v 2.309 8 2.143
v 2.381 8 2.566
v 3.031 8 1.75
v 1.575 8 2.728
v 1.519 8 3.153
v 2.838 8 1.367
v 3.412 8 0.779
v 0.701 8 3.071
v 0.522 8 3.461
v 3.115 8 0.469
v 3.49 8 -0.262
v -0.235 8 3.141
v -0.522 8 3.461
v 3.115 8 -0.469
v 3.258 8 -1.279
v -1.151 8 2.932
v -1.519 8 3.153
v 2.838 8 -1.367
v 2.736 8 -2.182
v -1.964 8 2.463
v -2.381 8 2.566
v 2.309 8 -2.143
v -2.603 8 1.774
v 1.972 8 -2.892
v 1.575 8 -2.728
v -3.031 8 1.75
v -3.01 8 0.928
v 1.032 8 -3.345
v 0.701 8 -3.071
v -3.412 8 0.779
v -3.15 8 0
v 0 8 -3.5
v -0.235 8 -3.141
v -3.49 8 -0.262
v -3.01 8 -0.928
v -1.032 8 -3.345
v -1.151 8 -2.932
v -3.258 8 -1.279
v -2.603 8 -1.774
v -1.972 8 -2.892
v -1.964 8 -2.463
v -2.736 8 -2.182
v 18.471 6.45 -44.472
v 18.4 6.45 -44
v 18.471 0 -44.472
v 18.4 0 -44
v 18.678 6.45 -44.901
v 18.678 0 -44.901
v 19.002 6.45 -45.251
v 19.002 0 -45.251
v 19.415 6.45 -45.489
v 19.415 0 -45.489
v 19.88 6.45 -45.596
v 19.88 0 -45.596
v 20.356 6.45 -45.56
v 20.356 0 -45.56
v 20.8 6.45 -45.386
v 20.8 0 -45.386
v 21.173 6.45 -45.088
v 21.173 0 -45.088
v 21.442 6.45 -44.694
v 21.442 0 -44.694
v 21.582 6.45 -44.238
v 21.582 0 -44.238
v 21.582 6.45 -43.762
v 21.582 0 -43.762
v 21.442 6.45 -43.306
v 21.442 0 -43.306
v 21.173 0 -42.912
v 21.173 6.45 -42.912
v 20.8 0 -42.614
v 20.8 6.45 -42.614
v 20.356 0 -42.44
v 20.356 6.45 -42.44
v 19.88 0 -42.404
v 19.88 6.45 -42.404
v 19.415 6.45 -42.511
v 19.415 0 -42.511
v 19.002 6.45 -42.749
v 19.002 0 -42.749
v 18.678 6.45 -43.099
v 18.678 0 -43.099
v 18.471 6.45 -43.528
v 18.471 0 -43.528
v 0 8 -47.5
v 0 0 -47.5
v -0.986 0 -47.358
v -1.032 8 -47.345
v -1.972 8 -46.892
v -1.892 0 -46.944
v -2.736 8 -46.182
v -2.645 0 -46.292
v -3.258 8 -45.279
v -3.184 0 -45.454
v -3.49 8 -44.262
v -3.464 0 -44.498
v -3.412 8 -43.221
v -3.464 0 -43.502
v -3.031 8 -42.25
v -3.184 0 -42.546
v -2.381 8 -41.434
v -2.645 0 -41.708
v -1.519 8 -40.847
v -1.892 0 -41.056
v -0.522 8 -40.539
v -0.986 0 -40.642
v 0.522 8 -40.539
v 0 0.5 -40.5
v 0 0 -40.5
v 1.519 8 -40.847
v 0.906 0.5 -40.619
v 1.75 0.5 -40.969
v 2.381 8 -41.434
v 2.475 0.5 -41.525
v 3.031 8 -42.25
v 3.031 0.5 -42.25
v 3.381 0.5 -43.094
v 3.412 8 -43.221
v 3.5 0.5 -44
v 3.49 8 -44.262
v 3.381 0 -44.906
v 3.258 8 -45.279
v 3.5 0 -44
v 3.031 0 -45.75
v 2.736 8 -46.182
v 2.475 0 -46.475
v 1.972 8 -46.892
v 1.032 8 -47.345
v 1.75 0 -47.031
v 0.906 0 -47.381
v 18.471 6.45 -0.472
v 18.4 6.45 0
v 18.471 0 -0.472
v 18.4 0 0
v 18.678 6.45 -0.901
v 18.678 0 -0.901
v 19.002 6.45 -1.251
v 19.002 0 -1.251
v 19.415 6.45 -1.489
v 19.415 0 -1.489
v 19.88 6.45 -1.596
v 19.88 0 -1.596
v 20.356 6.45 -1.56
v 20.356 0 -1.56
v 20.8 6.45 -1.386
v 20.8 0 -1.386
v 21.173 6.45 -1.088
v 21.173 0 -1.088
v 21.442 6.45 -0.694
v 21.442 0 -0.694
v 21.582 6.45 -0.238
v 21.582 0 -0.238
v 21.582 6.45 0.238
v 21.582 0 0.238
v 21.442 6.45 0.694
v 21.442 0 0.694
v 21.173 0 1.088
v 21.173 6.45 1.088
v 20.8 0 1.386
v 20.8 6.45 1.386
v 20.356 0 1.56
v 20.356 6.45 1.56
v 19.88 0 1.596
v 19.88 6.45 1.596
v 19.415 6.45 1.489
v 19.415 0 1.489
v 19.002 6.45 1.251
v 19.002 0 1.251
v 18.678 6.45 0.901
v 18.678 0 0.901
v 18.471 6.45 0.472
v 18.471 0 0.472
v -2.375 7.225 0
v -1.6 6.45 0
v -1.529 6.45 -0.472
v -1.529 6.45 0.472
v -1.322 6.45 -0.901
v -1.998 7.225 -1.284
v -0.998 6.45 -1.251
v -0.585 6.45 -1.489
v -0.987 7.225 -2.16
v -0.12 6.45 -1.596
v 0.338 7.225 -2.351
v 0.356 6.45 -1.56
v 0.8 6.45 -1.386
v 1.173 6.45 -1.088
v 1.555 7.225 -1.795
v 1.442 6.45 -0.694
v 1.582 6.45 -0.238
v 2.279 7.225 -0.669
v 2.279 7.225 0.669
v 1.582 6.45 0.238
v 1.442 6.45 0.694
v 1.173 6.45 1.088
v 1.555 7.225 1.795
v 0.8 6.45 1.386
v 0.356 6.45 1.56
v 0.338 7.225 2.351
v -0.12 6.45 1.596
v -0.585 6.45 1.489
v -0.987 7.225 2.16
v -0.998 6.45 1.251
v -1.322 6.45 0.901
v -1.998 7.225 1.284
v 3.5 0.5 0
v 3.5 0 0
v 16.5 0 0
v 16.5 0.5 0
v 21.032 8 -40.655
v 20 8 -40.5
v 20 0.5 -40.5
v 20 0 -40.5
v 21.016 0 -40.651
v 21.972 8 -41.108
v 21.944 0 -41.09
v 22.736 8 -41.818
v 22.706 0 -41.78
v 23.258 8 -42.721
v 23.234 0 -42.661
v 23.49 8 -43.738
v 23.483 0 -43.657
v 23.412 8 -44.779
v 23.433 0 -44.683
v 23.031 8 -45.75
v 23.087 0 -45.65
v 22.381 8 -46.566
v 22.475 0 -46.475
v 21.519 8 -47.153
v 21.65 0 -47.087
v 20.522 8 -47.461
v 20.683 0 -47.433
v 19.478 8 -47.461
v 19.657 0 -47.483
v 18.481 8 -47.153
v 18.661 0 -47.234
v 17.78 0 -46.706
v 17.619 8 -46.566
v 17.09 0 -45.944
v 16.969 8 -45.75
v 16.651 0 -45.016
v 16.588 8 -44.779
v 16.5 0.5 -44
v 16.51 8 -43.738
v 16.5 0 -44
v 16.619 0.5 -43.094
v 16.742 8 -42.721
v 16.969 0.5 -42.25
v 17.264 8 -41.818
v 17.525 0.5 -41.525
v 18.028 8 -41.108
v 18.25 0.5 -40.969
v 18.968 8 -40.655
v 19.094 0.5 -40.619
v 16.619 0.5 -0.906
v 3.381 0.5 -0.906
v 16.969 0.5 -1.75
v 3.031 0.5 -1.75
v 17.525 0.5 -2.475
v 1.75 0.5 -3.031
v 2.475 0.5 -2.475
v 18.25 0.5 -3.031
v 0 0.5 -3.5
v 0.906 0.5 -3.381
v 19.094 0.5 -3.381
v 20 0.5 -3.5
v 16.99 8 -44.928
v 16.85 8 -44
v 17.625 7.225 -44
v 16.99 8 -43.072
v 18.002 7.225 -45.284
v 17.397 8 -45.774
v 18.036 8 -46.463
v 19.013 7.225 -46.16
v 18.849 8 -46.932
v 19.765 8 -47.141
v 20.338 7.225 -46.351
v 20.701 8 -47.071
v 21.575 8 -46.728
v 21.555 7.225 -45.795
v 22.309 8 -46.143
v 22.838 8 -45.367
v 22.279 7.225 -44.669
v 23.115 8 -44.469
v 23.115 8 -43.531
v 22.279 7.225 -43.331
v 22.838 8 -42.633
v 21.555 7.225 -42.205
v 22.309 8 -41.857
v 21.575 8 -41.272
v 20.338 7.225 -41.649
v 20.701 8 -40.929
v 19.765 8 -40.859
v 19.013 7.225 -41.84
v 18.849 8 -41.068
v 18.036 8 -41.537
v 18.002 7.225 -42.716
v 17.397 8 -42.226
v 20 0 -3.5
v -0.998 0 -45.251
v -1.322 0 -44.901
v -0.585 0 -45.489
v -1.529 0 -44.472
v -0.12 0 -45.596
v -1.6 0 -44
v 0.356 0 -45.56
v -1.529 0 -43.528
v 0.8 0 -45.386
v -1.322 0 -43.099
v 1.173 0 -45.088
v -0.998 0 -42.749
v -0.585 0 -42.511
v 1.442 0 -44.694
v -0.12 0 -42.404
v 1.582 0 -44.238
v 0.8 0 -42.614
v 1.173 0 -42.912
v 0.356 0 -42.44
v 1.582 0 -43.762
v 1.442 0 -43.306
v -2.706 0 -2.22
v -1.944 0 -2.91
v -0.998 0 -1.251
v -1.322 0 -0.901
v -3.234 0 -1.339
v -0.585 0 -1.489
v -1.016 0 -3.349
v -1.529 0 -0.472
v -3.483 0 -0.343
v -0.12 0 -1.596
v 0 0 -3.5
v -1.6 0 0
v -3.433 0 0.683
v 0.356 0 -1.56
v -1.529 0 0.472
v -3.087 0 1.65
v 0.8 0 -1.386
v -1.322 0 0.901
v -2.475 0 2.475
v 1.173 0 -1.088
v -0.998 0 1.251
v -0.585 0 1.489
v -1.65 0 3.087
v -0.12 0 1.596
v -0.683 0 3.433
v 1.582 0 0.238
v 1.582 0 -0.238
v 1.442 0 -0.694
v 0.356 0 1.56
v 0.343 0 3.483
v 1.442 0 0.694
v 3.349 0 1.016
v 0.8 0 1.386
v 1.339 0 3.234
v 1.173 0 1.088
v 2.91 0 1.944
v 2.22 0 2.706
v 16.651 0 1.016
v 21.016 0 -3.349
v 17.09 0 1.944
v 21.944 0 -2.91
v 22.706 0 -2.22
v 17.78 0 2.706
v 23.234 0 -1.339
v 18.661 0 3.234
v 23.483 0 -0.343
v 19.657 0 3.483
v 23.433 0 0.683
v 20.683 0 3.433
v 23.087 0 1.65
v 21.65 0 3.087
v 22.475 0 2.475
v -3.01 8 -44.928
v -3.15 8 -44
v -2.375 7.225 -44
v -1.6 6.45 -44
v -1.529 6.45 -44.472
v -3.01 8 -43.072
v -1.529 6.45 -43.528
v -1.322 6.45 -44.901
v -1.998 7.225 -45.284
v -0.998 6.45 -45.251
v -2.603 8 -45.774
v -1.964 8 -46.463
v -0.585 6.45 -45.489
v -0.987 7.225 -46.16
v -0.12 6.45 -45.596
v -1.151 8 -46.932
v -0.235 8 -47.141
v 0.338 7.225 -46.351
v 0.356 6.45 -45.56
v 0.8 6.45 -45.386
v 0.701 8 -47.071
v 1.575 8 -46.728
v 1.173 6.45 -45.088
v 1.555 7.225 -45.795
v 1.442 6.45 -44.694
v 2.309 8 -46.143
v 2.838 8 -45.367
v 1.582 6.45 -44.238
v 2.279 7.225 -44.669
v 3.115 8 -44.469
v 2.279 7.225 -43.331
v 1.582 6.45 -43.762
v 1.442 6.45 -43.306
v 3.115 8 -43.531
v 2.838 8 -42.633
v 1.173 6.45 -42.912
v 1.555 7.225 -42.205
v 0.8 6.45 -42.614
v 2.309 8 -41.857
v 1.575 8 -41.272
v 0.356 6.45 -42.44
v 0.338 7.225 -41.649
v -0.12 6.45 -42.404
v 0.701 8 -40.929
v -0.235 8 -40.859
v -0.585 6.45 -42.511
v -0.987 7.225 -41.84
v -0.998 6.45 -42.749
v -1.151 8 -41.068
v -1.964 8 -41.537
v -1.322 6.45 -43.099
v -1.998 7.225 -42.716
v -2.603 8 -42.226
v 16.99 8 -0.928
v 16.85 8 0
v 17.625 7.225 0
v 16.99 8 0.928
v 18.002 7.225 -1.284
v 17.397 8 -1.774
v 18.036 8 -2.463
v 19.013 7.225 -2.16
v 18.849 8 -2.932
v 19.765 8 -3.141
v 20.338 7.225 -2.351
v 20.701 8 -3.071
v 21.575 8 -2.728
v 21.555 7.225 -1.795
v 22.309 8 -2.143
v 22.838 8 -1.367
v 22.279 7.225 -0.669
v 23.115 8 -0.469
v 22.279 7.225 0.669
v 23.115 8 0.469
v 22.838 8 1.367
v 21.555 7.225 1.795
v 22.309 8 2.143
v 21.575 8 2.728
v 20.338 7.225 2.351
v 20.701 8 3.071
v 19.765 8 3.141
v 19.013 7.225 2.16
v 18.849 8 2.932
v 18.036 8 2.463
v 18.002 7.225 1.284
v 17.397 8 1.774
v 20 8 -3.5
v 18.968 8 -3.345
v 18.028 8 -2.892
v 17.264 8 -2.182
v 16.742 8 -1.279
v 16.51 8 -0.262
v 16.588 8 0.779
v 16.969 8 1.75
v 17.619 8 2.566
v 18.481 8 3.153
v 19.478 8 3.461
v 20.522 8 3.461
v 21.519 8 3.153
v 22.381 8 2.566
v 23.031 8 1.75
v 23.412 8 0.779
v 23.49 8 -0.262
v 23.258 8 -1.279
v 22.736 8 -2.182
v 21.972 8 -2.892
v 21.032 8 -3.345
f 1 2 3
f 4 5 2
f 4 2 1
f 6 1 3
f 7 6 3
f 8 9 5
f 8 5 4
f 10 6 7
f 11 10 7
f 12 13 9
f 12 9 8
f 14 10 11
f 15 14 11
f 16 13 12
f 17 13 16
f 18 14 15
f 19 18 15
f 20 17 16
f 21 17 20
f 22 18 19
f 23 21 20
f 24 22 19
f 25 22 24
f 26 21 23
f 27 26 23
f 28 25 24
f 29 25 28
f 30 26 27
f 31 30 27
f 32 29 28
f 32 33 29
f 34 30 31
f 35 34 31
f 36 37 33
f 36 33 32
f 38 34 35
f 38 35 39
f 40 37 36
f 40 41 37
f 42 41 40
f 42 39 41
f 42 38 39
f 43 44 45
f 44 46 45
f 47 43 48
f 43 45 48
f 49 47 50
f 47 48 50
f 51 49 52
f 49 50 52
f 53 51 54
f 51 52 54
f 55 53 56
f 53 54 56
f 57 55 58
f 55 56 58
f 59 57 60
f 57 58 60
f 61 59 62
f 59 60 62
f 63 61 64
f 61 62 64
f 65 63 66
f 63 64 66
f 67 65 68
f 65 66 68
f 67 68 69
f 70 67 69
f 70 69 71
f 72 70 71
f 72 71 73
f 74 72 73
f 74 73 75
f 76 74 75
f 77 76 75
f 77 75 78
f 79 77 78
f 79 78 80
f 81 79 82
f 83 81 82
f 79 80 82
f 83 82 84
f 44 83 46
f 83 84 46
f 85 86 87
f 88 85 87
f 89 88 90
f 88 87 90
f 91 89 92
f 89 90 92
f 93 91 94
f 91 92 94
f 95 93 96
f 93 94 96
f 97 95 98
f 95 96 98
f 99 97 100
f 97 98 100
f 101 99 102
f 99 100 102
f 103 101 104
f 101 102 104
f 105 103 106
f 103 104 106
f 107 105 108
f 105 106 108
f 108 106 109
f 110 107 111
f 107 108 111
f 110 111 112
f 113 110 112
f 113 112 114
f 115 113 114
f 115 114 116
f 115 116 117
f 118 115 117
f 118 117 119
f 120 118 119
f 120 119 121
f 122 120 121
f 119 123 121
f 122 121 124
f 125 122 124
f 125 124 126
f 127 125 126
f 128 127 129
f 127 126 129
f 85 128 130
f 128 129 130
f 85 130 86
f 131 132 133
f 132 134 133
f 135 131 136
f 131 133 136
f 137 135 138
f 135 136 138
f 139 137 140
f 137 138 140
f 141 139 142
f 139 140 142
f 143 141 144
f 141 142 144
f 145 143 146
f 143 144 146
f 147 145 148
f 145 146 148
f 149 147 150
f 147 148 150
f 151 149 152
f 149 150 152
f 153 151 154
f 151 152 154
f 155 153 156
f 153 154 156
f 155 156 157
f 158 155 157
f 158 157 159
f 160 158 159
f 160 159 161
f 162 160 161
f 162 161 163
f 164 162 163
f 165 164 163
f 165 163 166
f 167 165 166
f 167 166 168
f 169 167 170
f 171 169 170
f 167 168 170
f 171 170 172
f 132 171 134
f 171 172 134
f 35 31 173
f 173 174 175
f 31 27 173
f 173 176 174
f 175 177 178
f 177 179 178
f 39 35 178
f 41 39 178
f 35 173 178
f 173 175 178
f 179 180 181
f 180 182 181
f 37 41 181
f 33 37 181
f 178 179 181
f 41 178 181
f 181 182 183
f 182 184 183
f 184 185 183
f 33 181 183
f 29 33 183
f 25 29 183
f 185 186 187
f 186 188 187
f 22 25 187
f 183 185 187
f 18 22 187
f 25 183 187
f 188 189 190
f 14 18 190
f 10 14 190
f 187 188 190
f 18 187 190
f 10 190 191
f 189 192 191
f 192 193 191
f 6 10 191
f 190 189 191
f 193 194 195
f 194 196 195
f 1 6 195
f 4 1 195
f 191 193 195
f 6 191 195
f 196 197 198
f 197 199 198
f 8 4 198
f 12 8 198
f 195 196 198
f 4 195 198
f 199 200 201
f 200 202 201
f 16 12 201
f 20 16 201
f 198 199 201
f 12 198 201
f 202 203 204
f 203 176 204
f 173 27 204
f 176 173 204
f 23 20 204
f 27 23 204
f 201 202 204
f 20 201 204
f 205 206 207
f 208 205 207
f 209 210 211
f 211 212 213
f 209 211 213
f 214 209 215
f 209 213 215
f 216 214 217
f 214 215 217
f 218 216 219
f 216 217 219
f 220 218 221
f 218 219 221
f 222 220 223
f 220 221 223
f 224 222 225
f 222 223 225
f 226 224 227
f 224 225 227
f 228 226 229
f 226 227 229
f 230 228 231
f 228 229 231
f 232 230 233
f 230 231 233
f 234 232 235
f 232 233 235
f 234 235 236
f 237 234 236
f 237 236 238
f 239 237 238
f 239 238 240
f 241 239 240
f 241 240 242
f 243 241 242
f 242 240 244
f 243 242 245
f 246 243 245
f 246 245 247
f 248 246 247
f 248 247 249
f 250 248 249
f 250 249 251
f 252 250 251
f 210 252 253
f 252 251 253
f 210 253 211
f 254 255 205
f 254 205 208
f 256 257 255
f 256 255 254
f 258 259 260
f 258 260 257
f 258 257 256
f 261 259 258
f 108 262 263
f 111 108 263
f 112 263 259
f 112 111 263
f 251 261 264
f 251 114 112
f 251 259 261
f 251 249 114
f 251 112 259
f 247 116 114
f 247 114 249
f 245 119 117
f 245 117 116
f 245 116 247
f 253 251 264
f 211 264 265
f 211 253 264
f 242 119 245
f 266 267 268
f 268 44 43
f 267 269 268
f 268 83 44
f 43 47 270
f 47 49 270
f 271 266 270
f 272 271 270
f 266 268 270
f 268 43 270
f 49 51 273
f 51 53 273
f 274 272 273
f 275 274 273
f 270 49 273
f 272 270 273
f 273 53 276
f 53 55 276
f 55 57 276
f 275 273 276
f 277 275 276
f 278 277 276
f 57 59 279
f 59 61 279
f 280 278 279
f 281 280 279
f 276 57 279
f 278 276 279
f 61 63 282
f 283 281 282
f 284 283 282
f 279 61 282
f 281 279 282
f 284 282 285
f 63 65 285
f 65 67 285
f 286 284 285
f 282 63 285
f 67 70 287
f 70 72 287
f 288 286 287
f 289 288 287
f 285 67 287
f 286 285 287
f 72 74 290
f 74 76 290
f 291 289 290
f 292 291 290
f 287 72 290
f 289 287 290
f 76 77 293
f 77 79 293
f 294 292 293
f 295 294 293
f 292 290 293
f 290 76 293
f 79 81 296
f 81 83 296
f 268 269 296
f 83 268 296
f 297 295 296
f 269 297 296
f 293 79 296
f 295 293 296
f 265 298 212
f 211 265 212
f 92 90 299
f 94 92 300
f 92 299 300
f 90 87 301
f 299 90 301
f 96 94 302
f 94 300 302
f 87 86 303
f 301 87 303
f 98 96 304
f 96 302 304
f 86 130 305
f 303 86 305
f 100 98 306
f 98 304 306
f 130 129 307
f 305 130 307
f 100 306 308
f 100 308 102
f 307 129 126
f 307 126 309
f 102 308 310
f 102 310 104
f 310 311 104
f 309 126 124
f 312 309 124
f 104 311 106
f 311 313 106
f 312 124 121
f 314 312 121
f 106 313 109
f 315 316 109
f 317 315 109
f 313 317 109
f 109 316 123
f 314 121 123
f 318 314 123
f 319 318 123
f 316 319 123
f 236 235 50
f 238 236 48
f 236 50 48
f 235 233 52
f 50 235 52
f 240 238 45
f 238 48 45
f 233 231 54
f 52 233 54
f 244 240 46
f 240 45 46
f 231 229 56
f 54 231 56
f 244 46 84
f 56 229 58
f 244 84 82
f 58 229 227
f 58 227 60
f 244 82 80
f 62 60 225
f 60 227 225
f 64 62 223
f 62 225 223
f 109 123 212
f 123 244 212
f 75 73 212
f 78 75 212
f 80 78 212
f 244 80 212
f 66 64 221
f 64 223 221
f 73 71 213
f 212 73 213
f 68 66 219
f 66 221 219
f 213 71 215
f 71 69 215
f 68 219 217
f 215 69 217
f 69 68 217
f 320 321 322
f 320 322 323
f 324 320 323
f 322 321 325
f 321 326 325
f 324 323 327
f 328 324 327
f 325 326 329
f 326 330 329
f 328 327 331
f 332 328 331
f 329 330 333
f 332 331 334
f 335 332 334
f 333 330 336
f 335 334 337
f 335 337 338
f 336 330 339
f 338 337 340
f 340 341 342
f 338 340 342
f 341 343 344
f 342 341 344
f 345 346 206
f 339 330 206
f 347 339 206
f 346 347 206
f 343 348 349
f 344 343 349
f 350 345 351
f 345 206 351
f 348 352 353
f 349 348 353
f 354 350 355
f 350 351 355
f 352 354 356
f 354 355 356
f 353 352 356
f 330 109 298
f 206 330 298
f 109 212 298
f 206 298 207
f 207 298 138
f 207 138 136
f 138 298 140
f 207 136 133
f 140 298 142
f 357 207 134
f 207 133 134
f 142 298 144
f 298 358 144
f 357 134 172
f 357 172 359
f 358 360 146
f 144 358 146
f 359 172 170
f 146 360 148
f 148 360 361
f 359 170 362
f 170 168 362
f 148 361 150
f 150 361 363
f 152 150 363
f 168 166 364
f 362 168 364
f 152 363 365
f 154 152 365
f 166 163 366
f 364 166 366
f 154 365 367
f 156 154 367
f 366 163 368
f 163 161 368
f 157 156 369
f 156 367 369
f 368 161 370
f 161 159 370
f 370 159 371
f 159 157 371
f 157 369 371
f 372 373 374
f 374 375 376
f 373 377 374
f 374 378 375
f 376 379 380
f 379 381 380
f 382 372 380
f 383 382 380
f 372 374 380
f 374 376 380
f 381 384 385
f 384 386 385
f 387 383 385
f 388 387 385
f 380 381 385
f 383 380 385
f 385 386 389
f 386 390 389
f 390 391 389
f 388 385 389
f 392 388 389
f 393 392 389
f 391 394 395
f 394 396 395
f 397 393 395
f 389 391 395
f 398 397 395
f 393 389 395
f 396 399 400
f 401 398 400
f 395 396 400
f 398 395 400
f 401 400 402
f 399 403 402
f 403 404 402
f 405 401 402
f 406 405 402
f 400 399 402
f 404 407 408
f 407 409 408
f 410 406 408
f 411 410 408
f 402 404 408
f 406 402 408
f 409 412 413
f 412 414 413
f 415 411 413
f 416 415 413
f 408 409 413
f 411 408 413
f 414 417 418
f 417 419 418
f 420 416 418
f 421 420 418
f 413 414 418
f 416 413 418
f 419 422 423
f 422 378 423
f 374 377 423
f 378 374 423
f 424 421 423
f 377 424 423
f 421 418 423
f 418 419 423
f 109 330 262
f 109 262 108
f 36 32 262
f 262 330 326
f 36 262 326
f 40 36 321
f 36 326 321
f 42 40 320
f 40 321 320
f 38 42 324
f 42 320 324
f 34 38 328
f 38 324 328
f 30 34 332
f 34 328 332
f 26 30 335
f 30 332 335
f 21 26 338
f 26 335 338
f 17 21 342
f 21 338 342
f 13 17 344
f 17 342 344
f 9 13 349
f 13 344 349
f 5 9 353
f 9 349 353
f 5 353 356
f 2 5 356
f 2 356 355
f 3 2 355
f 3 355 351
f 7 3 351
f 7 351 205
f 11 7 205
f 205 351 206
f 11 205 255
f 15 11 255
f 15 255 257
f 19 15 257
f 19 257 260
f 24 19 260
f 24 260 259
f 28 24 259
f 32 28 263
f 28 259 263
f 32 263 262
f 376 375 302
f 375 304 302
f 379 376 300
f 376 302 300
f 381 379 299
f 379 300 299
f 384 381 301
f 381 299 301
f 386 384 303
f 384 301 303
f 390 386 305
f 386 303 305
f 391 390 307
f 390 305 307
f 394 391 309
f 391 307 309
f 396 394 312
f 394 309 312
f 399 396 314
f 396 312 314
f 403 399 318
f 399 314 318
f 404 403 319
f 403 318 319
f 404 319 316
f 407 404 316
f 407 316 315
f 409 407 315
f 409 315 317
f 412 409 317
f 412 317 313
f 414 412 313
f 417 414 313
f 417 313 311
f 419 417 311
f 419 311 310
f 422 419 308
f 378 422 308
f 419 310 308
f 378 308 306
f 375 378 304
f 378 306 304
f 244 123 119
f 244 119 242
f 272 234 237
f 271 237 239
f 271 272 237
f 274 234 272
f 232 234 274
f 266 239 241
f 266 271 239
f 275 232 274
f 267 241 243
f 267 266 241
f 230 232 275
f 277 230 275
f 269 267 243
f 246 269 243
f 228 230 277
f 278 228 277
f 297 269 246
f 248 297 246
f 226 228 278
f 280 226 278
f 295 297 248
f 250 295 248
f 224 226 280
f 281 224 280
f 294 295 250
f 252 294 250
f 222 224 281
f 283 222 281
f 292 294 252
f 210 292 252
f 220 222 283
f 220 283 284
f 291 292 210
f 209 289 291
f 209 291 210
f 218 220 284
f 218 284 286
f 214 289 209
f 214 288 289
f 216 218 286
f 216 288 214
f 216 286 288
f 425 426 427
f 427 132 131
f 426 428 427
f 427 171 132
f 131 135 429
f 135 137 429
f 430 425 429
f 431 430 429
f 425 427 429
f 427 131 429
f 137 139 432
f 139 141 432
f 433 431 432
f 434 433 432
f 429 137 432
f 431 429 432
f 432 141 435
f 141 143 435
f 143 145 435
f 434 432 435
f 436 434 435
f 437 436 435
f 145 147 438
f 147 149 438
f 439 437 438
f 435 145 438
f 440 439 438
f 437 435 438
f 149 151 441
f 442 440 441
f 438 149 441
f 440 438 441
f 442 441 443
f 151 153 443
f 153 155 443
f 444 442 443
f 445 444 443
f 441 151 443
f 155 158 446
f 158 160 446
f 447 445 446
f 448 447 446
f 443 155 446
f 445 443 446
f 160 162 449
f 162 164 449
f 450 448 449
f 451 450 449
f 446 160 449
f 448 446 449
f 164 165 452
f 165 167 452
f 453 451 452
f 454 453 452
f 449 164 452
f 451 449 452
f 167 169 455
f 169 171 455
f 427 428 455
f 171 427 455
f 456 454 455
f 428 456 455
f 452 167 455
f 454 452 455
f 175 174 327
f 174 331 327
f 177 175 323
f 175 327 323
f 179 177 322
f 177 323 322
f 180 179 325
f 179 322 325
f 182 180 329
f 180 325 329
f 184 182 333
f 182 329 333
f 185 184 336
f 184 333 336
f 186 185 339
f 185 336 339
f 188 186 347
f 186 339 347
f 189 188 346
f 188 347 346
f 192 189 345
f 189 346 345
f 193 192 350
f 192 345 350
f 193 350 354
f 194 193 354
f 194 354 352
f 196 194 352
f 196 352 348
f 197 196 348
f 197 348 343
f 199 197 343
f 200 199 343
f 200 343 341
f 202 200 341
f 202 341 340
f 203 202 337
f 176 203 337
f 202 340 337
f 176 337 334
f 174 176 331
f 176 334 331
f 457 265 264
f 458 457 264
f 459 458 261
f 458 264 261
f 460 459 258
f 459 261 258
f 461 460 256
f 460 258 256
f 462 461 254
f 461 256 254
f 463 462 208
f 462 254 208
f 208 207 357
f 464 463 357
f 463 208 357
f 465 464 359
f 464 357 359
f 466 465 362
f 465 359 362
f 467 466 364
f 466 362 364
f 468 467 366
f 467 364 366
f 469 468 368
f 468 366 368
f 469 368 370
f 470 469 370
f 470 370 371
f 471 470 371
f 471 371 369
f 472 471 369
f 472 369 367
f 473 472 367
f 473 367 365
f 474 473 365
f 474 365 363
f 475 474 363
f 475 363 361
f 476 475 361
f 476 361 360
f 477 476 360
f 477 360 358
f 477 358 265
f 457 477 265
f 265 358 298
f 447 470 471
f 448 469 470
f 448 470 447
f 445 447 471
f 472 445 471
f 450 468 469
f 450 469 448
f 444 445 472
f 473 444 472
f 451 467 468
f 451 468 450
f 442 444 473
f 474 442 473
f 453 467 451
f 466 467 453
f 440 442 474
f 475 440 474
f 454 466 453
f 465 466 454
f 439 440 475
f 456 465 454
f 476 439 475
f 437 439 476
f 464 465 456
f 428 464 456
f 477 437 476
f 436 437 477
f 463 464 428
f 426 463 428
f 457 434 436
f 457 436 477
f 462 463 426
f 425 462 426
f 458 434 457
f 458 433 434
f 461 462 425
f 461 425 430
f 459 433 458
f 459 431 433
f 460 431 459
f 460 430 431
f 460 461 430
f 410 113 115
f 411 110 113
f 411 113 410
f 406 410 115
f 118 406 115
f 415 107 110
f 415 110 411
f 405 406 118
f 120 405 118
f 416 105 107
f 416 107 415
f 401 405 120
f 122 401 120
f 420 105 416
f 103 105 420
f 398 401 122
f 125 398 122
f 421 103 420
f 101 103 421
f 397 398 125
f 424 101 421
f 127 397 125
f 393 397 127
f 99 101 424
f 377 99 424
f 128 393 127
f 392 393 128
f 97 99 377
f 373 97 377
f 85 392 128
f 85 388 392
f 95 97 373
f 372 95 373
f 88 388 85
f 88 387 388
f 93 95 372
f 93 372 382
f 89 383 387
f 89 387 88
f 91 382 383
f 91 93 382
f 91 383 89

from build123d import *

# Parameters (mm, degrees)
SKETCH2_W                                       = 20
SKETCH2_H                                       = 44
BOSS_EXTRUDE2_DEPTH                             = 0.5
SKETCH4_R                                       = 3.5
BOSS_EXTRUDE3_DEPTH                             = 8
CSK_FOR_M3_FLAT_HEAD_MACHINE_SCREW1_D           = 3.2
CSK_FOR_M3_FLAT_HEAD_MACHINE_SCREW1_DEPTH       = 13.03862301
CSK_FOR_M3_FLAT_HEAD_MACHINE_SCREW1_CSINK_D     = 6.3
CSK_FOR_M3_FLAT_HEAD_MACHINE_SCREW1_CSINK_ANGLE = 90
CSK_FOR_M3_FLAT_HEAD_MACHINE_SCREW1_TIP         = 0.96137699


with BuildPart() as part:
    # Sketch2 → Boss-Extrude2 (new body)
    with BuildSketch(Plane(origin=(0, 0, 0), x_dir=(1, 0, 0), z_dir=(0, 1, 0))):
        with Locations((10, 22)):
            Rectangle(SKETCH2_W, SKETCH2_H)
    extrude(amount=BOSS_EXTRUDE2_DEPTH)

    # Sketch4 → Boss-Extrude3 (add)
    with BuildSketch(Plane(origin=(0, 0, 0), x_dir=(1, 0, 0), z_dir=(0, 1, 0))):
        with Locations(Location((20, 44, 0), (0, 0, 270))):
            Circle(SKETCH4_R)
        with Locations(Location((0, 44, 0), (0, 0, 90))):
            Circle(SKETCH4_R)
        with Locations(Location((20, 0, 0), (0, 0, 90))):
            Circle(SKETCH4_R)
        with Locations(Location((0, 0, 0), (0, 0, 90))):
            Circle(SKETCH4_R)
    extrude(amount=BOSS_EXTRUDE3_DEPTH)

    # CSK for M3 Flat Head Machine Screw1
    with Locations(Plane(origin=(0, 8, 0), x_dir=(1, 0, 0), z_dir=(0, 1, 0))):
        with Locations((20, 44), (0, 44), (0, 0), (20, 0)):
            CounterSinkHole(CSK_FOR_M3_FLAT_HEAD_MACHINE_SCREW1_D / 2, CSK_FOR_M3_FLAT_HEAD_MACHINE_SCREW1_CSINK_D / 2, depth=CSK_FOR_M3_FLAT_HEAD_MACHINE_SCREW1_DEPTH, counter_sink_angle=CSK_FOR_M3_FLAT_HEAD_MACHINE_SCREW1_CSINK_ANGLE)
            with Locations((0, 0, -(CSK_FOR_M3_FLAT_HEAD_MACHINE_SCREW1_DEPTH + CSK_FOR_M3_FLAT_HEAD_MACHINE_SCREW1_TIP / 2))):  # 118° drill point
                Cone(0, CSK_FOR_M3_FLAT_HEAD_MACHINE_SCREW1_D / 2, CSK_FOR_M3_FLAT_HEAD_MACHINE_SCREW1_TIP, mode=Mode.SUBTRACT)


solid = part.part
